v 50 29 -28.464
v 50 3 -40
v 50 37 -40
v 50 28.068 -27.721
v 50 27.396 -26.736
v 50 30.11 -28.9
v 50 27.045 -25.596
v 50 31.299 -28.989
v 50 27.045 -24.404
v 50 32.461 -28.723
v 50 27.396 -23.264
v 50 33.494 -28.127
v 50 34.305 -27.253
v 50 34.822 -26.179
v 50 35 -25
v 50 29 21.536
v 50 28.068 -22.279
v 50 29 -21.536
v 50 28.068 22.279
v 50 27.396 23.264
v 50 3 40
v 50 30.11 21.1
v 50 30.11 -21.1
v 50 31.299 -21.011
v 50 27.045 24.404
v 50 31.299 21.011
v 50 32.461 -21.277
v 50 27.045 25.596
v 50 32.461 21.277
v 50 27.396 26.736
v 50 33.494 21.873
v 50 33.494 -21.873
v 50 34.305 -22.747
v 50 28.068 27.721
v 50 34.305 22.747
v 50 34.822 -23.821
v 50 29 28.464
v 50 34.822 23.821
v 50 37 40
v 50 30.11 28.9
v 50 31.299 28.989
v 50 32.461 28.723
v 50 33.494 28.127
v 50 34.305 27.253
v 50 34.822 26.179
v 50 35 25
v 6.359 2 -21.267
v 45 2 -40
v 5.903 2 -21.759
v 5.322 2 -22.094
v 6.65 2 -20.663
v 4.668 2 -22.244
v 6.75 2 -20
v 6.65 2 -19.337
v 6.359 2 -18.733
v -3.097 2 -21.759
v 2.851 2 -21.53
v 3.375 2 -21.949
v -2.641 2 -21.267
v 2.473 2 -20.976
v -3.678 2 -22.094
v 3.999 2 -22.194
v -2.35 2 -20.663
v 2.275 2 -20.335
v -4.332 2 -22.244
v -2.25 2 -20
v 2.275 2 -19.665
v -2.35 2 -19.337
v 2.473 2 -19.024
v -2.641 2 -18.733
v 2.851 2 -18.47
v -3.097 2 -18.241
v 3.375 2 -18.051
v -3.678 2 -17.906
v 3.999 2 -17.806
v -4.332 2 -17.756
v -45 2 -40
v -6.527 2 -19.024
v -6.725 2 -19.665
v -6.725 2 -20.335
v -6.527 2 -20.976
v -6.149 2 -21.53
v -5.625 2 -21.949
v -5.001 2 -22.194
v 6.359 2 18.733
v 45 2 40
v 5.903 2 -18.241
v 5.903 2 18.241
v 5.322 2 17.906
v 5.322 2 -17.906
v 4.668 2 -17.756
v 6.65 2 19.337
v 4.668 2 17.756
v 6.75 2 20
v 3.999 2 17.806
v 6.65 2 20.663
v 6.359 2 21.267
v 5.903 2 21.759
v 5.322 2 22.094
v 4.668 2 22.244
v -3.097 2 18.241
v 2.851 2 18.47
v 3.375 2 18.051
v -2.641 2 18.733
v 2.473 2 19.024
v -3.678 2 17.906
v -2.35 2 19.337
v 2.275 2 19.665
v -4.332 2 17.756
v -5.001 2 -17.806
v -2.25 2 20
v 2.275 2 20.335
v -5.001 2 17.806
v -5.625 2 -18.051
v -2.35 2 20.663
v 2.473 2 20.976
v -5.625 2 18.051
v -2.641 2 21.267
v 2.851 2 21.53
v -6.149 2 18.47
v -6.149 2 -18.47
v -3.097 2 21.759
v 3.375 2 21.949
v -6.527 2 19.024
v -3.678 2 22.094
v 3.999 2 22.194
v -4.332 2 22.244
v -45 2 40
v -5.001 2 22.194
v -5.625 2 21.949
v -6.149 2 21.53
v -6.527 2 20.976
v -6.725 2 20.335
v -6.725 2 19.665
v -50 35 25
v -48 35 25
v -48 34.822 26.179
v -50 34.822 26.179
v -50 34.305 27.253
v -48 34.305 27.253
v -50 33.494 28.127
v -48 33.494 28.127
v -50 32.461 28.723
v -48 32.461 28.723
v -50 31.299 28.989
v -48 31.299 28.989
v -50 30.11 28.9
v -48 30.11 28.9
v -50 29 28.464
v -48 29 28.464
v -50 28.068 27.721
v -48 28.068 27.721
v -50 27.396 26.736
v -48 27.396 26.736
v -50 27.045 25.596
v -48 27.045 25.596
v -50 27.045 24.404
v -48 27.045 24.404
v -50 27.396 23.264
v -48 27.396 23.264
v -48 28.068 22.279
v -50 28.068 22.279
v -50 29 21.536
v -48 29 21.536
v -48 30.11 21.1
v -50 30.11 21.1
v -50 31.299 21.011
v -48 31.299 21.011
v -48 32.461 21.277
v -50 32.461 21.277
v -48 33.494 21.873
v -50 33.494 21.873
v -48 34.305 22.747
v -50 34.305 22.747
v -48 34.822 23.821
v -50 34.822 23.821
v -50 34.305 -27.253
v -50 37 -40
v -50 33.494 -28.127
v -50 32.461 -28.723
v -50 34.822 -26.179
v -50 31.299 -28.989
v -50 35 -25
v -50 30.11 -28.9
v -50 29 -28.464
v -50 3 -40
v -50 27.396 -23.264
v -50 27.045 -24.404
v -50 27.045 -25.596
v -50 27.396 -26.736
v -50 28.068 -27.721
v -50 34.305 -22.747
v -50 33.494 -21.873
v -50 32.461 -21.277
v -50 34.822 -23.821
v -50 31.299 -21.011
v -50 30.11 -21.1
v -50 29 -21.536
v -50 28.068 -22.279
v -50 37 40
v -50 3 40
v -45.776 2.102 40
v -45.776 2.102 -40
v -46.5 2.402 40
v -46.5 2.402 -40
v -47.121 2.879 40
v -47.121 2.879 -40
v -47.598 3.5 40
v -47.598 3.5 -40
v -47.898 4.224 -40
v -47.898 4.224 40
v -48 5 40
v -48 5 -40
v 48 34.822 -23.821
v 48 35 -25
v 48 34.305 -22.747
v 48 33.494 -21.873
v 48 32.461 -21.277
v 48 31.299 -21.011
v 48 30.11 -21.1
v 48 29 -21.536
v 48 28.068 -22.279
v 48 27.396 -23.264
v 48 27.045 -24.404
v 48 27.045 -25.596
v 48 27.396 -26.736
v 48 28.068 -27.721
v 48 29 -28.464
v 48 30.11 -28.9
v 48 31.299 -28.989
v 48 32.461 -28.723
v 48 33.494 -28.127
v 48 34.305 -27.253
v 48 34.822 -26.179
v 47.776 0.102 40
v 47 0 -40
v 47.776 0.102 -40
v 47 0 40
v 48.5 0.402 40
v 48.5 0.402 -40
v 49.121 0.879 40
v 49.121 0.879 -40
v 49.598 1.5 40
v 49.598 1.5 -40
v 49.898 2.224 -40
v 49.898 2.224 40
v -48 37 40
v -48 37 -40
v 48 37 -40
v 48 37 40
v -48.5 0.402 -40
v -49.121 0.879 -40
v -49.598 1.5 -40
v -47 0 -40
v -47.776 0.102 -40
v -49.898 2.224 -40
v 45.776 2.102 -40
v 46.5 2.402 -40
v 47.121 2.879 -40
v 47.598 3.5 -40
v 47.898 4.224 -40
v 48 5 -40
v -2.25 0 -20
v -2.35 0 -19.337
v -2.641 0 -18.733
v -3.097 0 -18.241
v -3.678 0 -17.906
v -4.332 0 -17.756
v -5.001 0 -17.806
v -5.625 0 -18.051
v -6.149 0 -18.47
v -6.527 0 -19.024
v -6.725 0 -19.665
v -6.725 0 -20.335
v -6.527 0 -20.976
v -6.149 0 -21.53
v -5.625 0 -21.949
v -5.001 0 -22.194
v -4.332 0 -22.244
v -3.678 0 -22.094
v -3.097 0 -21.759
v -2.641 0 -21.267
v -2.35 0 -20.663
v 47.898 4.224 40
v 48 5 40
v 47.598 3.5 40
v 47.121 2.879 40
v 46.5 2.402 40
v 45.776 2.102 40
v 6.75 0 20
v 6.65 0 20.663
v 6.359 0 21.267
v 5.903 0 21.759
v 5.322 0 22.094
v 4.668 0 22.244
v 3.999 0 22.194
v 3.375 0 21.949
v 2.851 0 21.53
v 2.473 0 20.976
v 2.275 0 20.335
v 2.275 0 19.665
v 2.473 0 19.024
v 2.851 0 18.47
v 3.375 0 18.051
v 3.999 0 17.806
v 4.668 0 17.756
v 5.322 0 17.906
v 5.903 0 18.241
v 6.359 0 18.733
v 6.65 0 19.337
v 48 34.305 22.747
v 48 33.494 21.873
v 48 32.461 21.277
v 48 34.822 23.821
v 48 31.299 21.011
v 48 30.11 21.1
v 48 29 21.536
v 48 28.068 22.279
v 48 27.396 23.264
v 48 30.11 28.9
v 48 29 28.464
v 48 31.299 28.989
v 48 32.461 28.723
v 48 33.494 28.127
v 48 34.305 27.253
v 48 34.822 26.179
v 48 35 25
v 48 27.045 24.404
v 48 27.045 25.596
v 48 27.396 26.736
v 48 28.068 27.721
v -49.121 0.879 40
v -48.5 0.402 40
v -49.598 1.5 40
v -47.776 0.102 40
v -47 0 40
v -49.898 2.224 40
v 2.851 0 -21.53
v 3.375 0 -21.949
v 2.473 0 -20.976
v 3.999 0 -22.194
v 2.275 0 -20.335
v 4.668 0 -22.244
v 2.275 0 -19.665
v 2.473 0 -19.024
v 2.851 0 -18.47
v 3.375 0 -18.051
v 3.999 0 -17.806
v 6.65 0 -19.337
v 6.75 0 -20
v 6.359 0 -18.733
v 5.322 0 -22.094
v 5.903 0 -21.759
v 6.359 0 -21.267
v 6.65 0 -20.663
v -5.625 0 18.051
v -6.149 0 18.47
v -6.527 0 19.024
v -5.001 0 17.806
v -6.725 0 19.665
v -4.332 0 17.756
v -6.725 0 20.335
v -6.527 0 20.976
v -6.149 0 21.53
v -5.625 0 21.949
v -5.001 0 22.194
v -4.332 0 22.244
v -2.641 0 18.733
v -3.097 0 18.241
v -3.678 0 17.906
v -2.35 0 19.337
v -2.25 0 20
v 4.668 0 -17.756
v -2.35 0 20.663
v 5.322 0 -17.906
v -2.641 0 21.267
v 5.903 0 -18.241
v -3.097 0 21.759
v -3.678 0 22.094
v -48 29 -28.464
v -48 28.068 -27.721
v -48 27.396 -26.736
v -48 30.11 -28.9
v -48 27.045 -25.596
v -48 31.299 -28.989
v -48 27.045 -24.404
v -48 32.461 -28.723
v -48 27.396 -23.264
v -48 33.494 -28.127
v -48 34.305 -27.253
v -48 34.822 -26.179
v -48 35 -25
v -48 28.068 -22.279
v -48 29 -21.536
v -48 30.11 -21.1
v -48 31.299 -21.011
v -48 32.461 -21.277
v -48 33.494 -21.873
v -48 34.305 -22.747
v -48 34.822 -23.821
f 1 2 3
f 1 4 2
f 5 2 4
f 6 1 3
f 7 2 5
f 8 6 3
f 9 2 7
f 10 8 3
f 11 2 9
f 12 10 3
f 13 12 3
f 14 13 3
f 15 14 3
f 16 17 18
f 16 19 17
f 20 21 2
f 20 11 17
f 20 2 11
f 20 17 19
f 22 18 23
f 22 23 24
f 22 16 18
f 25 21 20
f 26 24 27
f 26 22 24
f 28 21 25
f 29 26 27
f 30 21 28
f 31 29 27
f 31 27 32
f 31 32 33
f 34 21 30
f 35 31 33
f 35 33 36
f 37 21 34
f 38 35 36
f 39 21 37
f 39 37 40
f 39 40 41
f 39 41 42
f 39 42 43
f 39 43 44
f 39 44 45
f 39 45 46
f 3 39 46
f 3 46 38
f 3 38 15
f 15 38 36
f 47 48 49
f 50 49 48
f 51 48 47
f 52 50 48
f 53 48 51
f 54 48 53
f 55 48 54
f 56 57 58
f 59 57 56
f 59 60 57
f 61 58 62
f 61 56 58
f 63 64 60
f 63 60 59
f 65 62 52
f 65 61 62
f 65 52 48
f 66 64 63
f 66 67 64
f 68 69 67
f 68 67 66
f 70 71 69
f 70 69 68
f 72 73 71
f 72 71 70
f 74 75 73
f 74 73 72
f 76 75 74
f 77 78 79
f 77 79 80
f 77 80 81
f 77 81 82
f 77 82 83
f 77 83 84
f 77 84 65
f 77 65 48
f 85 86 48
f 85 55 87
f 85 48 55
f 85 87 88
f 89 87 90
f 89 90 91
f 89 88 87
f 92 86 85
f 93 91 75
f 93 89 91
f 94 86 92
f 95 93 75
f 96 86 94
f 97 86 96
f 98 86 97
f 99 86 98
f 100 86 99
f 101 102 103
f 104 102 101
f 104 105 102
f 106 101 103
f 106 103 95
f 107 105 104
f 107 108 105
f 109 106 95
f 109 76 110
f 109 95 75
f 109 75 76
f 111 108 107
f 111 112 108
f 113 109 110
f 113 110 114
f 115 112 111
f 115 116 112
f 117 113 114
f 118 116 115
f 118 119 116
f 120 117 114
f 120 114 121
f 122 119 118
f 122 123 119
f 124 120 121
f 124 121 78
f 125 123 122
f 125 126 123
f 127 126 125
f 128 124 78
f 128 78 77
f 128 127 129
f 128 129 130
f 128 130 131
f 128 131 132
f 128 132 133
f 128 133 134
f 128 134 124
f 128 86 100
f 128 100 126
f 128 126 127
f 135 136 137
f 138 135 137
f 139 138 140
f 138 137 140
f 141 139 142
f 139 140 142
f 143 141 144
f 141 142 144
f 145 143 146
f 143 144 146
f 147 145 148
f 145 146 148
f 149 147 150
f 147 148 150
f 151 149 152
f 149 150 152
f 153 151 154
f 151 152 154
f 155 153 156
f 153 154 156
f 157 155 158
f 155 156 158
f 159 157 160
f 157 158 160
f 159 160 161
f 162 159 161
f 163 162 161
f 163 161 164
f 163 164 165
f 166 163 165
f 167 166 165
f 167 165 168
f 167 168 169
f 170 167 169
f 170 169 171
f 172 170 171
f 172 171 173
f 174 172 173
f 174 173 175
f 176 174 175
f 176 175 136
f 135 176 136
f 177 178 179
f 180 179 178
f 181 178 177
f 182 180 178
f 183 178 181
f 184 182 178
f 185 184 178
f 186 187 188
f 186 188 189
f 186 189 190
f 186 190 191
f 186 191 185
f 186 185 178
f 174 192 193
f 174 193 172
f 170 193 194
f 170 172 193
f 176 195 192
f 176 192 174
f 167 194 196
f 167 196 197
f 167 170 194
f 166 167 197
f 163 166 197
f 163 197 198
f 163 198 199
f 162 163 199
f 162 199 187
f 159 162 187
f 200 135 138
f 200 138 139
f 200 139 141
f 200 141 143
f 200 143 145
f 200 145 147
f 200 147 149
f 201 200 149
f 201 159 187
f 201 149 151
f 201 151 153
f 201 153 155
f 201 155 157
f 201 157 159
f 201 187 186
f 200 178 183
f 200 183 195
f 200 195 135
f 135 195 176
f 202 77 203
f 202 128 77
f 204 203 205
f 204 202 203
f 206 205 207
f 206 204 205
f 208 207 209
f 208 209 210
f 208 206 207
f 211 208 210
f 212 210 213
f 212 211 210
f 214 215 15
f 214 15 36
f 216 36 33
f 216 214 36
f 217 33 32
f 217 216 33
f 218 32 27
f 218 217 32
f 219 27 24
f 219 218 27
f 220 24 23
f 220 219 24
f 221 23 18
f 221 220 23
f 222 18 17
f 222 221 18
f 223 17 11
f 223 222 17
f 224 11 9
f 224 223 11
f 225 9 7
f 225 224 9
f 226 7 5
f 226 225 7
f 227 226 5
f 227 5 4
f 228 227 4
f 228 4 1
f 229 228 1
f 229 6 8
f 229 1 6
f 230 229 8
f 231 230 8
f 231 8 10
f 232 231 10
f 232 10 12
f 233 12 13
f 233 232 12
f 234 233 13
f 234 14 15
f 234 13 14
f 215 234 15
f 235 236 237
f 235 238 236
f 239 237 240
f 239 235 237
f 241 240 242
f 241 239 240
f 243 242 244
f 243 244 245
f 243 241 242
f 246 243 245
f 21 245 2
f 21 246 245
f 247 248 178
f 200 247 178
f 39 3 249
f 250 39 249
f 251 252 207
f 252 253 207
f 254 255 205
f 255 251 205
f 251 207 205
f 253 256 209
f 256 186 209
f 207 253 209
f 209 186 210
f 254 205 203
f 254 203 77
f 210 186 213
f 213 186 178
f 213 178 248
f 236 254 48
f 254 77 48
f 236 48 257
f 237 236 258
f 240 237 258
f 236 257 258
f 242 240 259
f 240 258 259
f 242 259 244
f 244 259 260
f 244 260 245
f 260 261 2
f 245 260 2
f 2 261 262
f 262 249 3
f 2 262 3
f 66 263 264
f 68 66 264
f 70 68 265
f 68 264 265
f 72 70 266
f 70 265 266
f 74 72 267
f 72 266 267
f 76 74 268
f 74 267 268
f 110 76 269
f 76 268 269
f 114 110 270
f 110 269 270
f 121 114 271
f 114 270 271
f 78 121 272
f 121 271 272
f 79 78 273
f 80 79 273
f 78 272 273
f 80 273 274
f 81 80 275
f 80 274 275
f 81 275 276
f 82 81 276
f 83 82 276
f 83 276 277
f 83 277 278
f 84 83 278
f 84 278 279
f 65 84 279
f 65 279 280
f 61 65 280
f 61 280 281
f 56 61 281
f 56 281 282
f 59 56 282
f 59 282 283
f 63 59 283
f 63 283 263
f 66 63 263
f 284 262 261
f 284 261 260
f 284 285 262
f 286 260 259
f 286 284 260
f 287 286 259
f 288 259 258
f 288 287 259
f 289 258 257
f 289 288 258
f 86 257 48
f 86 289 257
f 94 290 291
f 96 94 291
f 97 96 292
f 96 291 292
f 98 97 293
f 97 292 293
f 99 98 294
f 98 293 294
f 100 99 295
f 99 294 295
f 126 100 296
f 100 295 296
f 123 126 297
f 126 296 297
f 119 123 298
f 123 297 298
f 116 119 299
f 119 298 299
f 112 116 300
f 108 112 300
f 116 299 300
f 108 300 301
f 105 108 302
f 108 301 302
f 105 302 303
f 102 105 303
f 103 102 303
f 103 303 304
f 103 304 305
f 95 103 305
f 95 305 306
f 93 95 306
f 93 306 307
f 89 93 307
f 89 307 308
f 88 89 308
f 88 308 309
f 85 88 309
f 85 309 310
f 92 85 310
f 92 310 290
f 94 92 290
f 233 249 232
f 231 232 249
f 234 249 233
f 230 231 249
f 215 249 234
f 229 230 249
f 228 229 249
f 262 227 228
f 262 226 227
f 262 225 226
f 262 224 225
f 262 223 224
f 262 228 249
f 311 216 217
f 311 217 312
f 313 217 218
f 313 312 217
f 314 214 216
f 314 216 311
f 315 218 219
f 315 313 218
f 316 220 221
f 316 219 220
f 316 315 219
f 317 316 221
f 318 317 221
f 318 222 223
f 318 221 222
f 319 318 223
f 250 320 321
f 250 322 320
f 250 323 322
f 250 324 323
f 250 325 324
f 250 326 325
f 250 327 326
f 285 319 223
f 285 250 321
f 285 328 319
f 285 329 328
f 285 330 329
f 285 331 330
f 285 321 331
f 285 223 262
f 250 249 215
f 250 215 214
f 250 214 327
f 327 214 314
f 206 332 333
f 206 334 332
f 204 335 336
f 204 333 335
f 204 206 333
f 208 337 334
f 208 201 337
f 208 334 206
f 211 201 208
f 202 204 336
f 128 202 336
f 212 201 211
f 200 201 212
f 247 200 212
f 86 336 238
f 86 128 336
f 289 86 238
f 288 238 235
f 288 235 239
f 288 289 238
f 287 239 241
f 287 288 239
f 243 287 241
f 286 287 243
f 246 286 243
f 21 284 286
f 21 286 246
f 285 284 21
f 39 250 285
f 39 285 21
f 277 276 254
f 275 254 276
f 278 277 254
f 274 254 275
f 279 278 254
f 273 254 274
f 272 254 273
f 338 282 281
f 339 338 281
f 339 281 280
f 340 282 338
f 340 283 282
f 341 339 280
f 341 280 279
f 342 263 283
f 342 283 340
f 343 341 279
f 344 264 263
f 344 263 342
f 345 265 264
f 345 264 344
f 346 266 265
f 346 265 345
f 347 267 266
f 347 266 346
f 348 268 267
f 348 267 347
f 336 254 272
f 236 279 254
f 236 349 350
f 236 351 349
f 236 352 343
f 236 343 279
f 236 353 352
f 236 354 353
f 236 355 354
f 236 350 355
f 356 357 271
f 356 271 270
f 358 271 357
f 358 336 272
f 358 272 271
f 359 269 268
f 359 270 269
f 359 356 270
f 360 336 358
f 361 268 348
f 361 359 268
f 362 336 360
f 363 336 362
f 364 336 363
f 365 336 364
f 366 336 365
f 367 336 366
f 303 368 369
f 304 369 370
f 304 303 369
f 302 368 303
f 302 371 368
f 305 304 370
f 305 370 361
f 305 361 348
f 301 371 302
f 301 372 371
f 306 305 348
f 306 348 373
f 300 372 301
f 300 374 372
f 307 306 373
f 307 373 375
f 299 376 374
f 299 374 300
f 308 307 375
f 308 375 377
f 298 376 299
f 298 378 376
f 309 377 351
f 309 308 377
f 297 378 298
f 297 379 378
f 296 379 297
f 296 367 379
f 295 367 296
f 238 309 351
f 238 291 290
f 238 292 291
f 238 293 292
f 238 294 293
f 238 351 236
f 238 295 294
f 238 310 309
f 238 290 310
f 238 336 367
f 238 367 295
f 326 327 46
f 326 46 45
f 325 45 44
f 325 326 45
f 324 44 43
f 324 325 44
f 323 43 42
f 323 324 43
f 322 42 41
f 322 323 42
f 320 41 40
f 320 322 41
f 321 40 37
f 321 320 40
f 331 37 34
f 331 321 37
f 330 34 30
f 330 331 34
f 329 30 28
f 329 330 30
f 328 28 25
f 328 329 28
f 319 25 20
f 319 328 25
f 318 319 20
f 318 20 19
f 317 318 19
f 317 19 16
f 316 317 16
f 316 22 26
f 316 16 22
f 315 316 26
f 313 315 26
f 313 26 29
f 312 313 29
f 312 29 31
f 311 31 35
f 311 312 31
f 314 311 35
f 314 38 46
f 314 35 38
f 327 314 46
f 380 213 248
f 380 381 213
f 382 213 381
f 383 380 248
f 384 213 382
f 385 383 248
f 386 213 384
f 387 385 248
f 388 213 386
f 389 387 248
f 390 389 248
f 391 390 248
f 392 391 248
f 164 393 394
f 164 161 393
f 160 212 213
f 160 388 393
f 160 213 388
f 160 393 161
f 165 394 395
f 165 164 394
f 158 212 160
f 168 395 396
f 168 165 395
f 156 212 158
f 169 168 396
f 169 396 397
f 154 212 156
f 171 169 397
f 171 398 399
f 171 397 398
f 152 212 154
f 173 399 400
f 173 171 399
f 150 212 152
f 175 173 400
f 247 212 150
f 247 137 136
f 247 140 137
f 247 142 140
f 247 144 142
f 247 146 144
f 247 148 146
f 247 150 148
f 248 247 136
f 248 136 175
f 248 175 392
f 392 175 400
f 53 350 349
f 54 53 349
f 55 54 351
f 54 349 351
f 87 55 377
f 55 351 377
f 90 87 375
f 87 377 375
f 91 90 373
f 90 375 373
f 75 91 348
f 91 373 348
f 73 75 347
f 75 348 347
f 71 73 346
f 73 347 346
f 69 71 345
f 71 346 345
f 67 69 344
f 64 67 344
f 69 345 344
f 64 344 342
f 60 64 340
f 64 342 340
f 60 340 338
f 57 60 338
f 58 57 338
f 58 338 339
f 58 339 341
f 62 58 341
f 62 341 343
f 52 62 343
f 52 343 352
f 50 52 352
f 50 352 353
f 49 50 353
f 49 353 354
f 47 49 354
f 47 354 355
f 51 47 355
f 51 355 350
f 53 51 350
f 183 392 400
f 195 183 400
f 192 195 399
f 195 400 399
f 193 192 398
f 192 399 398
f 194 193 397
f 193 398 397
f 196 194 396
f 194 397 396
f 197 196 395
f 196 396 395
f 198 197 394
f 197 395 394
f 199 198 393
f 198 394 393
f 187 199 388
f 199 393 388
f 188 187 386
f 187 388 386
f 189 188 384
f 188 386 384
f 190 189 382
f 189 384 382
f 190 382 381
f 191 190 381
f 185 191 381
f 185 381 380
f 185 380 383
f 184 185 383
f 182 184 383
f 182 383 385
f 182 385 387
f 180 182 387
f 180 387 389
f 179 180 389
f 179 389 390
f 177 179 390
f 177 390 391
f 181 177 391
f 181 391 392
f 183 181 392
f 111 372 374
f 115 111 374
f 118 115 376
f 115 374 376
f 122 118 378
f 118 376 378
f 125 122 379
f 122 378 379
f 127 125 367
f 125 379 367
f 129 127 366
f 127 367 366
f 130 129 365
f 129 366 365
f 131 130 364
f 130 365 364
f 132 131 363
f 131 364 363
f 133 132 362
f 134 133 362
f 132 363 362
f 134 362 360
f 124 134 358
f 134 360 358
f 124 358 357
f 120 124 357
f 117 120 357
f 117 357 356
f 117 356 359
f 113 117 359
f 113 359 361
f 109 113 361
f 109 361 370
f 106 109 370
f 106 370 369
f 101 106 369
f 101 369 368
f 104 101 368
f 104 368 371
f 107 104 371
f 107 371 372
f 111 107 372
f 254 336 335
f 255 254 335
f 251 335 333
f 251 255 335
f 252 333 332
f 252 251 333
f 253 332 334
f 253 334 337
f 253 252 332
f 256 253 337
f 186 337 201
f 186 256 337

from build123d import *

# Parameters (mm, degrees)
PAD_DEPTH            = 40
SKETCH001_R          = 4
POCKET_DEPTH         = 50.001
POCKET_DEPTH_BACK    = -50.001
SKETCH002_R          = 2.25
POCKET001_DEPTH      = 37.001
POCKET001_DEPTH_BACK = -0.001
FILLET_R             = 3


with BuildPart() as part:
    # Sketch → Pad (new body, symmetric)
    with BuildSketch(Plane.XY):
        Polygon((-50, 0), (50, 0), (50, 37), (48, 37), (48, 2), (-48, 2), (-48, 37), (-50, 37), align=None)
    extrude(amount=PAD_DEPTH, both=True)

    # Sketch001 → Pocket (cut, two sides)
    with BuildSketch(Plane.YZ) as pocket_sk:
        with Locations((31, 25)):
            Circle(SKETCH001_R)
        with Locations((31, -25)):
            Circle(SKETCH001_R)
    extrude(amount=-POCKET_DEPTH, mode=Mode.SUBTRACT)
    extrude(pocket_sk.sketch, amount=-POCKET_DEPTH_BACK, mode=Mode.SUBTRACT)

    # Sketch002 → Pocket001 (cut, two sides)
    with BuildSketch(Plane.XZ) as pocket001_sk:
        with Locations((-4.5, 20)):
            Circle(SKETCH002_R)
        with Locations((4.5, 20)):
            Circle(SKETCH002_R)
        with Locations((-4.5, -20)):
            Circle(SKETCH002_R)
        with Locations((4.5, -20)):
            Circle(SKETCH002_R)
    extrude(amount=-POCKET001_DEPTH, mode=Mode.SUBTRACT)
    extrude(pocket001_sk.sketch, amount=-POCKET001_DEPTH_BACK, mode=Mode.SUBTRACT)

    # Fillet
    fillet_edges = [part.edges().sort_by_distance(p)[0] for p in [
        (48, 2, 0),
        (-48, 2, 0),
        (50, 0, 0),
        (-50, 0, 0),
    ]]
    fillet(fillet_edges, radius=FILLET_R)


solid = part.part
